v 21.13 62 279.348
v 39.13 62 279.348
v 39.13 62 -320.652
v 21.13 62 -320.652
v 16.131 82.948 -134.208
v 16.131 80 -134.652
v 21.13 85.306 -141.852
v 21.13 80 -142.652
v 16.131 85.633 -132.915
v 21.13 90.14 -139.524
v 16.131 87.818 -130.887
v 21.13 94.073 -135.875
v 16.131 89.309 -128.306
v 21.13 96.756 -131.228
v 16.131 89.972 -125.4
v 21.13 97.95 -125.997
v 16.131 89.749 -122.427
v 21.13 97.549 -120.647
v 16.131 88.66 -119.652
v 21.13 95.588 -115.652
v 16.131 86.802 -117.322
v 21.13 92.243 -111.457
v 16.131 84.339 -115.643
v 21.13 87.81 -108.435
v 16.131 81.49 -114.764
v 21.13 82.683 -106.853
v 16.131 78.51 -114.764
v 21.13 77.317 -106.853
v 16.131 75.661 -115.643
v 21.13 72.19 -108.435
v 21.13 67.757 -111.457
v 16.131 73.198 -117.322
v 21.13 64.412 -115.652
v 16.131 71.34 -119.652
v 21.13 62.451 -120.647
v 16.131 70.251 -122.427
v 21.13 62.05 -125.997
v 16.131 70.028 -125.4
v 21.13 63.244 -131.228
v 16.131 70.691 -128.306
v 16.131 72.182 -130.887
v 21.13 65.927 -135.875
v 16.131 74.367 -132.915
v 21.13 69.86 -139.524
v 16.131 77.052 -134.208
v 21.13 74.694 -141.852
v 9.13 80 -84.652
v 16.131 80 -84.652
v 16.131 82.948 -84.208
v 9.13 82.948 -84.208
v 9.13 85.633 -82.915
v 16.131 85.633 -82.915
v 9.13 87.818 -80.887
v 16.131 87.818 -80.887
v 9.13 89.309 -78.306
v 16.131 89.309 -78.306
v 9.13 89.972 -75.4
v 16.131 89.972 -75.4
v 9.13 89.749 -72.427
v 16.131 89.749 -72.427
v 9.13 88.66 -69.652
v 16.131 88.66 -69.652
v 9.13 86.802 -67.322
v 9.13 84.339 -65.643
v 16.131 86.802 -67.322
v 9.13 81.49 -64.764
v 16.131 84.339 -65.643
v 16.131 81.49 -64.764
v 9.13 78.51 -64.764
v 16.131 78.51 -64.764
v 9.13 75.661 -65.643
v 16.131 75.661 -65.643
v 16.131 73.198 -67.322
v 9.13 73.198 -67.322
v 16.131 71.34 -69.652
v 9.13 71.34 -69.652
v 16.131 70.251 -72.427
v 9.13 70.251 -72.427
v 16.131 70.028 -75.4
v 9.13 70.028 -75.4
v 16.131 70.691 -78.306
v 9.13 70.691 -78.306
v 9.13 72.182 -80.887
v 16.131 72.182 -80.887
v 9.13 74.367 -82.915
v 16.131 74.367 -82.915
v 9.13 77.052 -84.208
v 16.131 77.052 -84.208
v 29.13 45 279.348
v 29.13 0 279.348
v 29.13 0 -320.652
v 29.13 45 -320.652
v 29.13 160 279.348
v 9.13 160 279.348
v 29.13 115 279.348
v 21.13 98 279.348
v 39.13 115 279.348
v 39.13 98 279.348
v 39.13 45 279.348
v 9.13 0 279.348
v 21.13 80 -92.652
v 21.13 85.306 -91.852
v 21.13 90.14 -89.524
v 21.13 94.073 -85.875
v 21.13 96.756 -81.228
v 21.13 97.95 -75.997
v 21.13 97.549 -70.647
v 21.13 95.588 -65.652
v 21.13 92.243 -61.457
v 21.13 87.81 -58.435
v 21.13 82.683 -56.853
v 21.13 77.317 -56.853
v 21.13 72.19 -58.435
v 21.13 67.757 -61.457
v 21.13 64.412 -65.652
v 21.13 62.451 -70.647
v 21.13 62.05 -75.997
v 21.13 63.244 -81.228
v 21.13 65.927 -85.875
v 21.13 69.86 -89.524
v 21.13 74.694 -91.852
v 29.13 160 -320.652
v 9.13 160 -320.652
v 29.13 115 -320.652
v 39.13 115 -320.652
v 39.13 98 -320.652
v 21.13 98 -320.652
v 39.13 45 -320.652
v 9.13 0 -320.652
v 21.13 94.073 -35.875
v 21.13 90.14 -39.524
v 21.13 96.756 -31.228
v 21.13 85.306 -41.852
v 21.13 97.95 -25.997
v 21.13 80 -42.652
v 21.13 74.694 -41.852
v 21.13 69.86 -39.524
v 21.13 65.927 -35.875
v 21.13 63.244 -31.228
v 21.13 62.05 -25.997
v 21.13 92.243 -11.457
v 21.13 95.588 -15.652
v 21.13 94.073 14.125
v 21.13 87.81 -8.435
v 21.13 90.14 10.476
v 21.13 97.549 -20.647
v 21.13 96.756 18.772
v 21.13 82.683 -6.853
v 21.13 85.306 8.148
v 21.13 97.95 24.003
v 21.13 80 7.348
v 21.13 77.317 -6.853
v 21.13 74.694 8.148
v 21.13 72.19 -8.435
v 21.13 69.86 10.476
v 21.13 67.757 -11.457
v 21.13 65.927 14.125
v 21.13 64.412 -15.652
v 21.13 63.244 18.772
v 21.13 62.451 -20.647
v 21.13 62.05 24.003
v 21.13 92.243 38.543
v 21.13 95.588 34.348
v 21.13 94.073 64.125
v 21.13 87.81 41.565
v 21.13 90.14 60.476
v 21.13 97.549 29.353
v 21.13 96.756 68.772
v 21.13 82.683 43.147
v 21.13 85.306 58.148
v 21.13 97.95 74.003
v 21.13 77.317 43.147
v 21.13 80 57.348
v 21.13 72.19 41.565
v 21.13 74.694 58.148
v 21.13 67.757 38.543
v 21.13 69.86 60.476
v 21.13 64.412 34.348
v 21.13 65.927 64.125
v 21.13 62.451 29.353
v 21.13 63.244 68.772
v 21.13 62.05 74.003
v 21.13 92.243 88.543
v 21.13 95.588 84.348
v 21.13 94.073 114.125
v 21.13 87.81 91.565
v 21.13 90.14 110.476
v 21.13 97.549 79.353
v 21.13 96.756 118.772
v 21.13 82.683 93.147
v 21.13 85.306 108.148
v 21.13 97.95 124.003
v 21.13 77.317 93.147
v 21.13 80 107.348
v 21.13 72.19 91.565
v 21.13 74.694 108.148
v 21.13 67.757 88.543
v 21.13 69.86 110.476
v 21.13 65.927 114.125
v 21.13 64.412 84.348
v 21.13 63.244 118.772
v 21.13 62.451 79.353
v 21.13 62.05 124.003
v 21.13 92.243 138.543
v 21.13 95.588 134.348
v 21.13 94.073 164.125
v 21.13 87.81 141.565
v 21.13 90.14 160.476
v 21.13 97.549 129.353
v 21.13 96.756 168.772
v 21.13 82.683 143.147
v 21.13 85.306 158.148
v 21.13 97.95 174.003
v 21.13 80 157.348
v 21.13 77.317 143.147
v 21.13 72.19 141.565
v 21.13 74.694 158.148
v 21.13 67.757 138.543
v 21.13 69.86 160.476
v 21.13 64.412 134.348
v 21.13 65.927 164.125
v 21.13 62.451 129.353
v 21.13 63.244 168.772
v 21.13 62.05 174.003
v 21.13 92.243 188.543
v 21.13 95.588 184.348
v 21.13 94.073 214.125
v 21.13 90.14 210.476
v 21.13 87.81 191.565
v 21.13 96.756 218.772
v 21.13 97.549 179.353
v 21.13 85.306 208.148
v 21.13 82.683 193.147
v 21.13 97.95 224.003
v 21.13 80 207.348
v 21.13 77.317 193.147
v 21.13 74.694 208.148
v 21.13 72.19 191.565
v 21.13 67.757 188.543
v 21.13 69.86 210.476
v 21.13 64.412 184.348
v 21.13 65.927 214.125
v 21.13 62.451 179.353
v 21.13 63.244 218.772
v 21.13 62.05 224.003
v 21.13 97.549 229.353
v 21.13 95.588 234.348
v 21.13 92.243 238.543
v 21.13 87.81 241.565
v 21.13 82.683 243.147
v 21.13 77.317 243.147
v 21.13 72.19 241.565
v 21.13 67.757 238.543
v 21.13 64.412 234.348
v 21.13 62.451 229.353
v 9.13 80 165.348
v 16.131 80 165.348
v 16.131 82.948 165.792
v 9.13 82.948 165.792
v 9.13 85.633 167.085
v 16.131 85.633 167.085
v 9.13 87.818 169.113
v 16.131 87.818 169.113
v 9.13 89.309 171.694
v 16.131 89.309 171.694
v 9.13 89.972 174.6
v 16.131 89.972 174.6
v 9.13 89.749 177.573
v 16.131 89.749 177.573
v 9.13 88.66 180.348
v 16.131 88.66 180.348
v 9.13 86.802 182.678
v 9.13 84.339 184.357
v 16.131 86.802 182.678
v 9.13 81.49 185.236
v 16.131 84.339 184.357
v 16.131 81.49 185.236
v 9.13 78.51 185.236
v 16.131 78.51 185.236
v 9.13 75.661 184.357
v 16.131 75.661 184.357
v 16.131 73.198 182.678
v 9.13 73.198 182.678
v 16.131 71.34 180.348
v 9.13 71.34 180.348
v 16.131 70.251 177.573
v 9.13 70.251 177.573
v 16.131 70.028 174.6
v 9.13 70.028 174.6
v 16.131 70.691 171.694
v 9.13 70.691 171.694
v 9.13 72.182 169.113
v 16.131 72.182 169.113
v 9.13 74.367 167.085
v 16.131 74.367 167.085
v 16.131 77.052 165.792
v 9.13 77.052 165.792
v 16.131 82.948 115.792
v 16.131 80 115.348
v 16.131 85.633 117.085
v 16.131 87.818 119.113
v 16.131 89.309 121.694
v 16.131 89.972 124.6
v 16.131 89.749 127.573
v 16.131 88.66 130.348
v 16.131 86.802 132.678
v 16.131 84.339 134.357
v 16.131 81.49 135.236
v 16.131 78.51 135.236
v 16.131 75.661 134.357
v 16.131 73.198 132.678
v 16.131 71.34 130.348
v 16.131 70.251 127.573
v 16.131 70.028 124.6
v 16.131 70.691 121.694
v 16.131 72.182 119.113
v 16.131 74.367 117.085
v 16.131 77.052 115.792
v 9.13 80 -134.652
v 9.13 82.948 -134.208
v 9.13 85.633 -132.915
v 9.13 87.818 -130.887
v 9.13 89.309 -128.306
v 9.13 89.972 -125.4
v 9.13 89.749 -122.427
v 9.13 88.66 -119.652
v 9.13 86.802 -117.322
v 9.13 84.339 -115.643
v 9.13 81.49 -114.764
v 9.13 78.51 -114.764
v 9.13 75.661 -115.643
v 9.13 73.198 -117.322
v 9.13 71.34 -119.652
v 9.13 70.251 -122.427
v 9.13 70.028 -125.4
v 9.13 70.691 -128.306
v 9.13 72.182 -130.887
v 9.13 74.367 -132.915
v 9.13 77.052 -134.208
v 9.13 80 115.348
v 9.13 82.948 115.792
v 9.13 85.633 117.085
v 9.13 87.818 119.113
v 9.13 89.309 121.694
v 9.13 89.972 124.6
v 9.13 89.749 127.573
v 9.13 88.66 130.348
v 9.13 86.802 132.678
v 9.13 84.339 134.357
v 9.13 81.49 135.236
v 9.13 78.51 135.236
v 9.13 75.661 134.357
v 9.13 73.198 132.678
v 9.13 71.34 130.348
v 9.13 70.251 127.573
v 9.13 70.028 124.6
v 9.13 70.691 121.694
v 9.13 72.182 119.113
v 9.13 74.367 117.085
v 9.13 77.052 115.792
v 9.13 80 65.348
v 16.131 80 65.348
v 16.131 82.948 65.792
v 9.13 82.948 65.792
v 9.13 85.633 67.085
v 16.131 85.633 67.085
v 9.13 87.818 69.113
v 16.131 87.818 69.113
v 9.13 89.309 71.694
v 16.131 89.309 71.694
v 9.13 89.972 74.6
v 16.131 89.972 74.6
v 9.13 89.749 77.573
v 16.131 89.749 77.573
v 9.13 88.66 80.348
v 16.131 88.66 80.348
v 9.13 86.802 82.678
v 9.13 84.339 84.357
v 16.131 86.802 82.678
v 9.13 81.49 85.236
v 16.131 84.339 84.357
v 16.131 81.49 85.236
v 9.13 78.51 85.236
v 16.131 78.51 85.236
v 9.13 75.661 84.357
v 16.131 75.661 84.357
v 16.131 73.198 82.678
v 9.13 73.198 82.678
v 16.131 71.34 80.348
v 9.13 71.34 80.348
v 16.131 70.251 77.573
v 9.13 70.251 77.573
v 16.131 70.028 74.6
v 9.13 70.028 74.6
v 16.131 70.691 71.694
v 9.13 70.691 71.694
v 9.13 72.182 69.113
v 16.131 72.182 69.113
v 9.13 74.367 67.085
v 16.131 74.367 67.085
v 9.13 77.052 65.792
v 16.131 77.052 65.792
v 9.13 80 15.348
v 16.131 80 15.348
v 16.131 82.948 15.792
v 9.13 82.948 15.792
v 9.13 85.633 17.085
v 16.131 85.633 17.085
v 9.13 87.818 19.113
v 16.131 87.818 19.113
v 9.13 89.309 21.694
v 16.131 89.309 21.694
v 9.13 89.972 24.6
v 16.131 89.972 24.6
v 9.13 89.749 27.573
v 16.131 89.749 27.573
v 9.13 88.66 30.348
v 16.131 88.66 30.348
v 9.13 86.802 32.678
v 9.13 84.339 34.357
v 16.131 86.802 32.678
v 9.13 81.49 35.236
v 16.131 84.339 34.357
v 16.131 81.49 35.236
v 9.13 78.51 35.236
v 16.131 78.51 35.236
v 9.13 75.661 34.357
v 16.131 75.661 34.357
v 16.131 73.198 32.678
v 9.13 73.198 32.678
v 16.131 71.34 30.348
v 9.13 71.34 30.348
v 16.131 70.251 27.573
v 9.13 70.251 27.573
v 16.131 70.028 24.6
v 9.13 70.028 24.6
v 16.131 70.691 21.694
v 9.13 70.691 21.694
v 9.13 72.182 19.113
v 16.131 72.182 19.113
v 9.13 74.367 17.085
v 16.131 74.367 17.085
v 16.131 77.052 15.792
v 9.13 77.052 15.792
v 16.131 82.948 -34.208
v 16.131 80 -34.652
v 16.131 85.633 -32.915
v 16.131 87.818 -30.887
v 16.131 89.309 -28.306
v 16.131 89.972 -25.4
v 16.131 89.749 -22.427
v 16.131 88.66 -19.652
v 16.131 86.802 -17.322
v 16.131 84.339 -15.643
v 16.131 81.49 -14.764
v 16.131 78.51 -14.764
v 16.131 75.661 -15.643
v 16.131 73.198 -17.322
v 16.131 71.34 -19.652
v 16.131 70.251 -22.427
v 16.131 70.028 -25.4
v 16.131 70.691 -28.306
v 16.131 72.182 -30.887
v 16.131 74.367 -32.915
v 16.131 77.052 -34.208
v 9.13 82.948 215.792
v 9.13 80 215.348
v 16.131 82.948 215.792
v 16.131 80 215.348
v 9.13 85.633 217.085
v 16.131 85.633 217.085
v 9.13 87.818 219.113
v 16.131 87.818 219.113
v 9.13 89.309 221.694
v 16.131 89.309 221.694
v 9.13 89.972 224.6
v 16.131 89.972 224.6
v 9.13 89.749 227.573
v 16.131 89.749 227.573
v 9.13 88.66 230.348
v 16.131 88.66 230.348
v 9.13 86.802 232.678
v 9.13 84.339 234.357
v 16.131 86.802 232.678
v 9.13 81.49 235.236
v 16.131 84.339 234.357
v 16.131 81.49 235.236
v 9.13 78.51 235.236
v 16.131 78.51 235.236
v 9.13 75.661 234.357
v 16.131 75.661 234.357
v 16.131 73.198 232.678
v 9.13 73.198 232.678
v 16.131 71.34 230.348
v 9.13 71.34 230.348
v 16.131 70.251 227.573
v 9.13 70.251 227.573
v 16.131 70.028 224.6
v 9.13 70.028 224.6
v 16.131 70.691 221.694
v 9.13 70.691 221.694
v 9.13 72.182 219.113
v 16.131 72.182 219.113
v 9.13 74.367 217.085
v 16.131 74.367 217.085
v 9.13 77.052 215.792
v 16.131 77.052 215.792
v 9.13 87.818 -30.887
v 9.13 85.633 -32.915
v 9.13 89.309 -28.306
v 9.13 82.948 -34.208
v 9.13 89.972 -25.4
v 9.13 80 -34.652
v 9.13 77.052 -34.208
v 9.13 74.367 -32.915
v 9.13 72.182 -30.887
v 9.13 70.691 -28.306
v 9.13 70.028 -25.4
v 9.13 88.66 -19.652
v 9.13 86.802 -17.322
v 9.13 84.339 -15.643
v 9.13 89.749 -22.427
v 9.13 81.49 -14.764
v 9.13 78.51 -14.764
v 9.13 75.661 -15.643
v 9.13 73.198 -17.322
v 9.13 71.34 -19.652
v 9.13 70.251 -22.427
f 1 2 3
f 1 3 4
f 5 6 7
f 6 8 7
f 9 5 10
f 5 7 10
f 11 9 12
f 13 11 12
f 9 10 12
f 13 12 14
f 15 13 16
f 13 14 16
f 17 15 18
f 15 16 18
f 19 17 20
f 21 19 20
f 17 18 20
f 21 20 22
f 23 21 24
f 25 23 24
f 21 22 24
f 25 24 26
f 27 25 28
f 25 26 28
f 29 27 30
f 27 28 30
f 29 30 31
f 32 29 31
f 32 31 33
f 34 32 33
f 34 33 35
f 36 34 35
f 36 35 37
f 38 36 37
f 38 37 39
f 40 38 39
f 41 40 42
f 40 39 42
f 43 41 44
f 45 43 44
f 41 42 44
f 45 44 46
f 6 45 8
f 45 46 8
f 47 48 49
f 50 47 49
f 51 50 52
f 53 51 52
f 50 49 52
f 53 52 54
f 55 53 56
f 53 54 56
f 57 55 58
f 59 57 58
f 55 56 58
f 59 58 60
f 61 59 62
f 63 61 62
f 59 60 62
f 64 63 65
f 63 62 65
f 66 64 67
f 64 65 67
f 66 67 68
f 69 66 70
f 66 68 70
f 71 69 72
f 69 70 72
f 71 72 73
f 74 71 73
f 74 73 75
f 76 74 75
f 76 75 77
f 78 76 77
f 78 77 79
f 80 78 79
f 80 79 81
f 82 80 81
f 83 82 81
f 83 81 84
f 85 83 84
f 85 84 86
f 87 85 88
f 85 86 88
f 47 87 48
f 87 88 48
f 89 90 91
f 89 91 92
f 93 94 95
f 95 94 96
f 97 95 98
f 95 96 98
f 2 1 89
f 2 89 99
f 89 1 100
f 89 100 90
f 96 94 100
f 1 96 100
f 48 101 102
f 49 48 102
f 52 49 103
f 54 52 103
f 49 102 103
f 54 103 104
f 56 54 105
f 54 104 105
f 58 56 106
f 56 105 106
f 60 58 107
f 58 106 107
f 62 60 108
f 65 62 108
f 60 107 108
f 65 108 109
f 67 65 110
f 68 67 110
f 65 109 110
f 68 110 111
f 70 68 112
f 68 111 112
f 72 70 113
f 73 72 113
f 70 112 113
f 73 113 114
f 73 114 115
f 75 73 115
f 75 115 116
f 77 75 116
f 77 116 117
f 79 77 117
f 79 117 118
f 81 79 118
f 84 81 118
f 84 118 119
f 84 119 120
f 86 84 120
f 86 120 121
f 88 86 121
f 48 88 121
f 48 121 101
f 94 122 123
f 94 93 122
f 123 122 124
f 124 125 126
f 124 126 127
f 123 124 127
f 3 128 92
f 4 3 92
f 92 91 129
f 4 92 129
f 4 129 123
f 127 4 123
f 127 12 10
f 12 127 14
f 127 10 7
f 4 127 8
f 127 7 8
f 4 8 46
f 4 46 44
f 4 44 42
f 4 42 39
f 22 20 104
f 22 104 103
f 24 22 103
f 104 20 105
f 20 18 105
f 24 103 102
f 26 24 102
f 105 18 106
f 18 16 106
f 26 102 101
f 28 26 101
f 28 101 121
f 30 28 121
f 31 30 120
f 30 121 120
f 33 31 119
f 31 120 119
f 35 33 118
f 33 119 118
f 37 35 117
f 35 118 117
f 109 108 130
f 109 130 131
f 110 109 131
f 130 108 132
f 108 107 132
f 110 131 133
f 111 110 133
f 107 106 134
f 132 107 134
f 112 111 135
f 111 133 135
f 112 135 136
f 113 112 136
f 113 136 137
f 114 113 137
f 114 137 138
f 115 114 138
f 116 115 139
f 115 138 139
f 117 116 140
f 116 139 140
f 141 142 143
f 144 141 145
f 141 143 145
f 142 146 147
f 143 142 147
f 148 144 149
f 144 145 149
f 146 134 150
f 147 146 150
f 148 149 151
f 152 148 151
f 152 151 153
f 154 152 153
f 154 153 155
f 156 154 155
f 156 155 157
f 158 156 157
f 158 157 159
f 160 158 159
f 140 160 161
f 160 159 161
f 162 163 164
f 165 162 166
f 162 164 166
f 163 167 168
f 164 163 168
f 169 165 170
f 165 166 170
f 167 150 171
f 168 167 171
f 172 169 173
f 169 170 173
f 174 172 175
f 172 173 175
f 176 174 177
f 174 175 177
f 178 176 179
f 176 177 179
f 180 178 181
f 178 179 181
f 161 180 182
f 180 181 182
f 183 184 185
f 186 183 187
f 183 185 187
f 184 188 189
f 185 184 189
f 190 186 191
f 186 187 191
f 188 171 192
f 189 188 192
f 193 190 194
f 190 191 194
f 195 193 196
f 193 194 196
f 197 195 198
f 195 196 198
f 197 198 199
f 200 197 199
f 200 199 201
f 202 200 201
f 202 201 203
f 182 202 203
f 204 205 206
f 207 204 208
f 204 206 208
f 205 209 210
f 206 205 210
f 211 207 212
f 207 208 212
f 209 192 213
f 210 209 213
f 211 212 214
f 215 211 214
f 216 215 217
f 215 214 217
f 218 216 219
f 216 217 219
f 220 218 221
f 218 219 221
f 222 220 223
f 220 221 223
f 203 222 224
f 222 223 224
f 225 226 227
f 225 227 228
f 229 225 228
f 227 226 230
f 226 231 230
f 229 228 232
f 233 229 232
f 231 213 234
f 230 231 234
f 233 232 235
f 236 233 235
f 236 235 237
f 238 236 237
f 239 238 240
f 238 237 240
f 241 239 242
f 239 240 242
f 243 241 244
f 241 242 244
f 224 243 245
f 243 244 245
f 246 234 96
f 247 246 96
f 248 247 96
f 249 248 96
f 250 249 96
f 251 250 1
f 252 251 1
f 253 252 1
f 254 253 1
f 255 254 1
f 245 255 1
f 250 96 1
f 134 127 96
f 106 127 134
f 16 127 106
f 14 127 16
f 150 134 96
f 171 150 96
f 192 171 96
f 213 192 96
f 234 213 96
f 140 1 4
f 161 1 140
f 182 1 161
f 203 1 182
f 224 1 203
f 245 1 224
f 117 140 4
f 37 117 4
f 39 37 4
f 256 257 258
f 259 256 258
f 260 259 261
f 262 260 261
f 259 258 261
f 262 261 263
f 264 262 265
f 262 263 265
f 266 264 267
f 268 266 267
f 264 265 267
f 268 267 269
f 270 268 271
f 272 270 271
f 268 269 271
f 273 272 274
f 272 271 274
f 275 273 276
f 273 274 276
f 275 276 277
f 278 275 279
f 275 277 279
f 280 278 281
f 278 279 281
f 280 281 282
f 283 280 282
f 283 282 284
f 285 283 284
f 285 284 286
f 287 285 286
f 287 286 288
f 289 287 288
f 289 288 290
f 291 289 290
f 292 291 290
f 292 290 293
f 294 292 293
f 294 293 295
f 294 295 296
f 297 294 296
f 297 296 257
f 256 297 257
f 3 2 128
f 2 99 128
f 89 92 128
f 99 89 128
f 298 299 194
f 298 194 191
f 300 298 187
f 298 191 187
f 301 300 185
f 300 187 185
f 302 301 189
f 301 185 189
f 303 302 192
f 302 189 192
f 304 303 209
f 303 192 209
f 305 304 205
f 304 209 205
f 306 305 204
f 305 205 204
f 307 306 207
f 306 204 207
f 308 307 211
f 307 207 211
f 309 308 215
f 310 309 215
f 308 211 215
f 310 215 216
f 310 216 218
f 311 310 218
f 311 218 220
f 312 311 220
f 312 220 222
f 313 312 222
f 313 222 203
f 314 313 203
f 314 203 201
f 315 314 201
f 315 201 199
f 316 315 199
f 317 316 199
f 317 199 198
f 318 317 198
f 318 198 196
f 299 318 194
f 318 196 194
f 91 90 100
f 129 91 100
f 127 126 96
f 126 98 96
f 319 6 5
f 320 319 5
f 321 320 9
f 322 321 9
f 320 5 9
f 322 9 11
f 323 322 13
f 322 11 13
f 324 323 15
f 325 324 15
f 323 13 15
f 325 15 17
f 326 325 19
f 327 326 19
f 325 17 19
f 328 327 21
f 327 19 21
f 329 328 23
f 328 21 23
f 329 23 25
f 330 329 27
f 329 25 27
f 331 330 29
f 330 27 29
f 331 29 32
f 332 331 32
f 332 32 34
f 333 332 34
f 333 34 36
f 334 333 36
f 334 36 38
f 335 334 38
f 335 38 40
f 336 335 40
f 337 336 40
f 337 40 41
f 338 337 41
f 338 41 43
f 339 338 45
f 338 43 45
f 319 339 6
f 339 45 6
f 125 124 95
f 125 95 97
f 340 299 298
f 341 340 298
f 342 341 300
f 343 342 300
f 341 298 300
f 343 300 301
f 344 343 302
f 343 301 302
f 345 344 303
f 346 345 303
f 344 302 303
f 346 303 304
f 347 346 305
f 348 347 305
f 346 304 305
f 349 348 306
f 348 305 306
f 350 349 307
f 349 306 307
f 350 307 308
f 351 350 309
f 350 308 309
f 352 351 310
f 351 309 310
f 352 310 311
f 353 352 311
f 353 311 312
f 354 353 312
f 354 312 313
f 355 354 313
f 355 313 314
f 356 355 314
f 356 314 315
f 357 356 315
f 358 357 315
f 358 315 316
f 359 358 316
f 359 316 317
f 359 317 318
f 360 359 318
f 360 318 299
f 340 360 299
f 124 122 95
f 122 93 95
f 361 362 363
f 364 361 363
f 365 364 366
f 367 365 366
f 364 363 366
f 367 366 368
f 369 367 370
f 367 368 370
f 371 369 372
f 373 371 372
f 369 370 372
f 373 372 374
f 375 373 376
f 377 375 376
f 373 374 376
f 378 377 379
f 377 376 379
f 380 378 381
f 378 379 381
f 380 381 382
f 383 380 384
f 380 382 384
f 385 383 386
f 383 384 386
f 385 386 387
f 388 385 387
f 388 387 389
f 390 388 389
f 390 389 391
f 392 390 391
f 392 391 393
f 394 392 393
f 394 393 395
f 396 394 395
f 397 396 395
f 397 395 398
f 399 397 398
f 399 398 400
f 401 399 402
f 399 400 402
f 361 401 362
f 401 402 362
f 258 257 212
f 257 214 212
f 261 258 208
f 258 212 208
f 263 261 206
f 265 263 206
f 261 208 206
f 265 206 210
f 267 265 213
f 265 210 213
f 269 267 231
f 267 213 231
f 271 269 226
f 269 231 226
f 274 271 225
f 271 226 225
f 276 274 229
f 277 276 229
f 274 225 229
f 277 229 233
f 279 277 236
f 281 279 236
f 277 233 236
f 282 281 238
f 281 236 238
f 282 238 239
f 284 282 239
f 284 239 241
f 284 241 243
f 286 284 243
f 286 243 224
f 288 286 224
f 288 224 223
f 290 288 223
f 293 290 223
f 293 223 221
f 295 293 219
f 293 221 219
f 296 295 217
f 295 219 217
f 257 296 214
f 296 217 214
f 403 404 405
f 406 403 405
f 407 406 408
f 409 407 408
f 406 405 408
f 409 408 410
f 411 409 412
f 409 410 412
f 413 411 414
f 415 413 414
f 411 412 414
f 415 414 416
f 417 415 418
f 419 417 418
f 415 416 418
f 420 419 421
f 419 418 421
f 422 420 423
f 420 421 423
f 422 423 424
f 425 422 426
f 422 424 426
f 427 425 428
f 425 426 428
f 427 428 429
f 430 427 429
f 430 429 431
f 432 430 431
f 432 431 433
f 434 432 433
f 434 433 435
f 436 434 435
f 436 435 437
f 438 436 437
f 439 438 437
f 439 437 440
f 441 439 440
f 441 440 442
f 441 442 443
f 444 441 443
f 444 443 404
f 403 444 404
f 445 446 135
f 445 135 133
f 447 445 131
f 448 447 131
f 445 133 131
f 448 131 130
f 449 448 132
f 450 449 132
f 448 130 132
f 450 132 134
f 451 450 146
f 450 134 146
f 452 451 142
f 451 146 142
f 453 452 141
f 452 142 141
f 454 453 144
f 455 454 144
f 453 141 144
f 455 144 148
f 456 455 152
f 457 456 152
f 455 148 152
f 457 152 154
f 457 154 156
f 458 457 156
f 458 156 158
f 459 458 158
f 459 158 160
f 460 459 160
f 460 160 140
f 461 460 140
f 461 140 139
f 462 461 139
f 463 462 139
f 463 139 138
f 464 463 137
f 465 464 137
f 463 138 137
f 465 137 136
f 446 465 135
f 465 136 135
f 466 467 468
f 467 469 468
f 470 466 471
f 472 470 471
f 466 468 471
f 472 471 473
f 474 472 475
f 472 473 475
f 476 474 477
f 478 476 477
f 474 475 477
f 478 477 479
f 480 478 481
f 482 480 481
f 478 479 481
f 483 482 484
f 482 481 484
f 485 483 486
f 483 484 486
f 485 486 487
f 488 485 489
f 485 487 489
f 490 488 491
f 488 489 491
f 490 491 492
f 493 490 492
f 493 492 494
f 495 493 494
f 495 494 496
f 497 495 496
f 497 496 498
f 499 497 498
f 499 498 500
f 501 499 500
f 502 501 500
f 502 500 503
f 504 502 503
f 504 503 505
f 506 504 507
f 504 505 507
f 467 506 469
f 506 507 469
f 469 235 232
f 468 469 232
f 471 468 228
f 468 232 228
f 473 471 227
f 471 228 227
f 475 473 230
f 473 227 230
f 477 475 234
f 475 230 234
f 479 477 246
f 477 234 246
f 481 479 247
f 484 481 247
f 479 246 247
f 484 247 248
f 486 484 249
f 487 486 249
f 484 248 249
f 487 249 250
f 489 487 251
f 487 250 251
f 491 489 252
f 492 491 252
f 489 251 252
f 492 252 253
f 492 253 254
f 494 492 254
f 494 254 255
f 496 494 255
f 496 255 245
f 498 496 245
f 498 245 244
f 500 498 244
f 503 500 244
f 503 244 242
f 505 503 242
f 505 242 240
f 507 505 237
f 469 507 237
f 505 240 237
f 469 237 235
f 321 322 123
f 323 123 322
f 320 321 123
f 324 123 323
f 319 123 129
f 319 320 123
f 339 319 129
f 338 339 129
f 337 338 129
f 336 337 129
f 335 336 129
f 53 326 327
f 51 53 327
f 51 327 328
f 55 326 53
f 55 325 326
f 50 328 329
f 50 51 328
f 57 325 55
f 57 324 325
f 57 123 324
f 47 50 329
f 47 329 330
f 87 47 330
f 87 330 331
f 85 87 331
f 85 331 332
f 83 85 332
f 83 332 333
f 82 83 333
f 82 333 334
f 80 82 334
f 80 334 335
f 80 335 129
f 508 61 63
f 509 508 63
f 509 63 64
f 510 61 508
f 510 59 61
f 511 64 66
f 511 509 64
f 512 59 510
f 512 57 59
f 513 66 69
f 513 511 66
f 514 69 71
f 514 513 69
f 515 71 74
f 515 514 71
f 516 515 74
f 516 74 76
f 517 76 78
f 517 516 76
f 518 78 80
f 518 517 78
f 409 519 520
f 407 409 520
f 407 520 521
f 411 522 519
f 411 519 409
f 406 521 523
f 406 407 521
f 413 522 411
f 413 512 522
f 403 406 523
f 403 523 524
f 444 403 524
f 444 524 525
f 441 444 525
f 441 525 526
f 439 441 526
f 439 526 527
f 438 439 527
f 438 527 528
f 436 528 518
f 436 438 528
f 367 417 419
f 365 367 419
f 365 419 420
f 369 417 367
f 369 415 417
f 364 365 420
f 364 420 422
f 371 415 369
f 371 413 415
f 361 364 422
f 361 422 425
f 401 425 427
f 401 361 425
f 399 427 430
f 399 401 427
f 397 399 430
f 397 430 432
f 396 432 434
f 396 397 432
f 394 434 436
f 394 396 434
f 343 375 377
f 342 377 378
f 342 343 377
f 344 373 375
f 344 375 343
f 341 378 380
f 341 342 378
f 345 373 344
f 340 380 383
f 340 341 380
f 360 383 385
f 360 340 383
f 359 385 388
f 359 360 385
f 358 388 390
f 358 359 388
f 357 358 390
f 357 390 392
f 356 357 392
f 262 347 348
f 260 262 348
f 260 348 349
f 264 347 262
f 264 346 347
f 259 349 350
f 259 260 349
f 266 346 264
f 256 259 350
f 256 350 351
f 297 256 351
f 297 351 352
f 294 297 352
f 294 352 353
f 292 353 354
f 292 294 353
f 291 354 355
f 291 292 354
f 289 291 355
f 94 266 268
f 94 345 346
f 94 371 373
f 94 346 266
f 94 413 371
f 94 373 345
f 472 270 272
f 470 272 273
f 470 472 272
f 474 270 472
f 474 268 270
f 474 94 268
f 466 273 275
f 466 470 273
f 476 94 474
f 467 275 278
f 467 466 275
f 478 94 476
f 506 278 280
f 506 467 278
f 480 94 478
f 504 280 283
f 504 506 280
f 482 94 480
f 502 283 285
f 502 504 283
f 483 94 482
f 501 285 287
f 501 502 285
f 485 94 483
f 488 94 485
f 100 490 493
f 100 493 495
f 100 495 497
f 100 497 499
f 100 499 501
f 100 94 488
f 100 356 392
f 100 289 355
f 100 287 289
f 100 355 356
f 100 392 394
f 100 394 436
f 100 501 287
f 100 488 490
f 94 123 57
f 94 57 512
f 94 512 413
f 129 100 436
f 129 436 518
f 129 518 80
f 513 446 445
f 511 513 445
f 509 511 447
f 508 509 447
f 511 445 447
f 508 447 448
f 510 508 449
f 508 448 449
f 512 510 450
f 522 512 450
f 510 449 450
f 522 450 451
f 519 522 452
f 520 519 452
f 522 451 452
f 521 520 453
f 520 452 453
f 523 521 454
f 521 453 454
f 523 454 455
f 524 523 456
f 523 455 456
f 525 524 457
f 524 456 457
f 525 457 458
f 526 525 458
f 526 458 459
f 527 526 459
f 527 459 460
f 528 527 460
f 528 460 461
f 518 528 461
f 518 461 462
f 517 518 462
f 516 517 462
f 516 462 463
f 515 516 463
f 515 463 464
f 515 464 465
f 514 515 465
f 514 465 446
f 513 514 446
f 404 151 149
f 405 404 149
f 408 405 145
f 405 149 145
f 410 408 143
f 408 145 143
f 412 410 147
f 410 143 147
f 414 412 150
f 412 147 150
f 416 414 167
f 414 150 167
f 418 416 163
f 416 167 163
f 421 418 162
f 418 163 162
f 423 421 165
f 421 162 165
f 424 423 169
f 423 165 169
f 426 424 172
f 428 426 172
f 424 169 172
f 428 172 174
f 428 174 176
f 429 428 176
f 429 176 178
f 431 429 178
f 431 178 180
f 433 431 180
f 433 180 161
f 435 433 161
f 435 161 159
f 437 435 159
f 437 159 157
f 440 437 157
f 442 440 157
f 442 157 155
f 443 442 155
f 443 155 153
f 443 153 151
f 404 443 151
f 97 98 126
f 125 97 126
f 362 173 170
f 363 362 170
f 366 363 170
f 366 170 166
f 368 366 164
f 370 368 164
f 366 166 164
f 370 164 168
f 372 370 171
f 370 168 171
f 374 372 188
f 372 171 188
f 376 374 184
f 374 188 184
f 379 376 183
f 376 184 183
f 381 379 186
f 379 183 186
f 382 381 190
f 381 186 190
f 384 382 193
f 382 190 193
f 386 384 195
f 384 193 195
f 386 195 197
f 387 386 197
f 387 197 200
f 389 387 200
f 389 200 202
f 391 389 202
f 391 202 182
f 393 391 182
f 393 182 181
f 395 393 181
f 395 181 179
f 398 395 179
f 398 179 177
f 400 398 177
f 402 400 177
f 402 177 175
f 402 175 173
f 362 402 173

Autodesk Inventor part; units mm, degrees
ref_plane "YZ Plane" through (0, 0, 0) normal (1, 0, 0) x (0, 1, 0)
ref_plane "XZ Plane" through (0, 0, 0) normal (0, 1, 0) x (-1, 0, 0)
ref_plane "XY Plane" through (0, 0, 0) normal (0, 0, 1) x (1, 0, 0)
sketch "Sketch1" plane through (0, 0, 0) normal (0, 1, 0) x (-1, 0, 0)
  line L0 (0, 279.3478) -> (-39.1304, 279.3478)
  line L1 (-39.1304, 279.3478) -> (-39.1304, -320.6522)
  line L2 (-39.1304, -320.6522) -> (0, -320.6522)
  line L3 (0, -320.6522) -> (0, 279.3478)
  line L4 (-39.1304, 279.3478) -> (-29.1304, 279.3478)
  line L5 (-29.1304, 254.3478) -> (-39.1304, 254.3478)
  line L6 (-39.1304, 254.3478) -> (-39.1304, 279.3478)
  line L7 (-39.1304, -320.6522) -> (-29.1304, -320.6522)
  line L8 (-29.1304, -295.6522) -> (-39.1304, -295.6522)
  line L9 (-39.1304, -295.6522) -> (-39.1304, -320.6522)
  point P0 (0, 0)
  point P1 (-39.1304, 254.3478)
  point P2 (-39.1304, -295.6522)
  dimension "d0" = 600
  dimension "d4" = 25
  dimension "d5" = 25
  dimension "d28" = 39.1304
extrude "Extrusion1" add sketch "Sketch1" along normal blind 160
sketch "Sketch2" plane through (0, 0, 279.3478) normal (0, 0, 1) x (1, 0, 0)
  line L0 (0, 160) -> (39.1304, 160) projected
  line L1 (0, 160) -> (39.1304, 160)
  line L2 (39.1304, 160) -> (39.1304, 0)
  line L3 (39.1304, 0) -> (0, 0)
  line L4 (0, 0) -> (0, 160)
  line L5 (39.1304, 160) -> (29.1304, 160)
  line L6 (29.1304, 160) -> (29.1304, 115)
  line L7 (29.1304, 115) -> (39.1304, 115)
  line L8 (39.1304, 115) -> (39.1304, 160)
  line L9 (39.1304, 0) -> (29.1304, 0)
  line L10 (29.1304, 0) -> (29.1304, 45)
  line L11 (29.1304, 45) -> (39.1304, 45)
  line L12 (39.1304, 45) -> (39.1304, 0)
  circle A0 centre (39.1304, 80) radius 18
  line L13 (21.1304, 75) -> (39.1304, 75)
  line L14 (39.1304, 75) -> (39.1304, 98)
  line L15 (39.1304, 98) -> (21.1304, 98)
  line L16 (21.1304, 98) -> (21.1304, 75)
  line L17 (21.1304, 75) -> (39.1304, 75)
  line L18 (39.1304, 75) -> (39.1304, 62)
  line L19 (39.1304, 62) -> (21.1304, 62)
  line L20 (21.1304, 62) -> (21.1304, 75)
  line L21 (39.1304, 0) -> (39.1304, 160) projected
  line L22 (0, 160) -> (9.1304, 160)
  line L23 (9.1304, 160) -> (9.1304, 0)
  line L24 (9.1304, 0) -> (0, 0)
  line L25 (0, 0) -> (0, 160)
  point P0 (0, 0)
  point P1 (34.1304, 115)
  point P2 (34.1304, 160)
  point P3 (39.1304, 45)
  point P4 (39.1304, 115)
  dimension "d6" = 10
  dimension "d7" = 45
  dimension "d8" = 45
  dimension "d9" = 18
  dimension "d10" = 36
  dimension "d11" = 80
  dimension "d12" = 80
  dimension "d15" = 30
extrude "Extrusion2" cut sketch "Sketch2" against normal up to surface (600 mm away) contours L0 L23 L3 L4 | L0 L2 L7 L6 | L10 L11 L2 L3 | L2 L13 A0 | A0 L16 L15 | L2 A0 L13 | A0 L13 L16 | L19 L20 L13 A0
sketch "Sketch3" plane through (21.1304, 62, 279.3478) normal (1, 0, 0) x (0, 0, -1)
  line L0 (600, 0) -> (0, 0) projected
  line L1 (0, 0) -> (0, 36) projected
  line L2 (0, 36) -> (600, 36) projected
  circle A0 centre (54, 18) radius 10
  circle A1 centre (104, 18) radius 10
  circle A2 centre (154, 18) radius 10
  circle A3 centre (204, 18) radius 10
  circle A4 centre (254, 18) radius 10
  circle A5 centre (304, 18) radius 10
  circle A6 centre (354, 18) radius 10
  circle A7 centre (404, 18) radius 10
  circle A8 centre (454, 18) radius 10
  point P0 (279.3478, -62)
  dimension "d18" = 50
extrude "Extrusion3" cut sketch "Sketch3" against normal blind 25 contours A0 | A1 | A2 | A3 | A4 | A5 | A6 | A7
chamfer "Chamfer1" distance 8 distance2 5 8 edges at (21.1304, 80, 235.3478) (21.1304, 80, 185.3478) (21.1304, 80, 135.3478) (21.1304, 80, 85.3478) (21.1304, 80, 35.3478) (21.1304, 80, -14.6522) (21.1304, 80, -64.6522) (21.1304, 80, -114.6522) measured on face at (21.1304, 80, -258.6522)
properties part number "MainRails" material "Aluminum 6061"
